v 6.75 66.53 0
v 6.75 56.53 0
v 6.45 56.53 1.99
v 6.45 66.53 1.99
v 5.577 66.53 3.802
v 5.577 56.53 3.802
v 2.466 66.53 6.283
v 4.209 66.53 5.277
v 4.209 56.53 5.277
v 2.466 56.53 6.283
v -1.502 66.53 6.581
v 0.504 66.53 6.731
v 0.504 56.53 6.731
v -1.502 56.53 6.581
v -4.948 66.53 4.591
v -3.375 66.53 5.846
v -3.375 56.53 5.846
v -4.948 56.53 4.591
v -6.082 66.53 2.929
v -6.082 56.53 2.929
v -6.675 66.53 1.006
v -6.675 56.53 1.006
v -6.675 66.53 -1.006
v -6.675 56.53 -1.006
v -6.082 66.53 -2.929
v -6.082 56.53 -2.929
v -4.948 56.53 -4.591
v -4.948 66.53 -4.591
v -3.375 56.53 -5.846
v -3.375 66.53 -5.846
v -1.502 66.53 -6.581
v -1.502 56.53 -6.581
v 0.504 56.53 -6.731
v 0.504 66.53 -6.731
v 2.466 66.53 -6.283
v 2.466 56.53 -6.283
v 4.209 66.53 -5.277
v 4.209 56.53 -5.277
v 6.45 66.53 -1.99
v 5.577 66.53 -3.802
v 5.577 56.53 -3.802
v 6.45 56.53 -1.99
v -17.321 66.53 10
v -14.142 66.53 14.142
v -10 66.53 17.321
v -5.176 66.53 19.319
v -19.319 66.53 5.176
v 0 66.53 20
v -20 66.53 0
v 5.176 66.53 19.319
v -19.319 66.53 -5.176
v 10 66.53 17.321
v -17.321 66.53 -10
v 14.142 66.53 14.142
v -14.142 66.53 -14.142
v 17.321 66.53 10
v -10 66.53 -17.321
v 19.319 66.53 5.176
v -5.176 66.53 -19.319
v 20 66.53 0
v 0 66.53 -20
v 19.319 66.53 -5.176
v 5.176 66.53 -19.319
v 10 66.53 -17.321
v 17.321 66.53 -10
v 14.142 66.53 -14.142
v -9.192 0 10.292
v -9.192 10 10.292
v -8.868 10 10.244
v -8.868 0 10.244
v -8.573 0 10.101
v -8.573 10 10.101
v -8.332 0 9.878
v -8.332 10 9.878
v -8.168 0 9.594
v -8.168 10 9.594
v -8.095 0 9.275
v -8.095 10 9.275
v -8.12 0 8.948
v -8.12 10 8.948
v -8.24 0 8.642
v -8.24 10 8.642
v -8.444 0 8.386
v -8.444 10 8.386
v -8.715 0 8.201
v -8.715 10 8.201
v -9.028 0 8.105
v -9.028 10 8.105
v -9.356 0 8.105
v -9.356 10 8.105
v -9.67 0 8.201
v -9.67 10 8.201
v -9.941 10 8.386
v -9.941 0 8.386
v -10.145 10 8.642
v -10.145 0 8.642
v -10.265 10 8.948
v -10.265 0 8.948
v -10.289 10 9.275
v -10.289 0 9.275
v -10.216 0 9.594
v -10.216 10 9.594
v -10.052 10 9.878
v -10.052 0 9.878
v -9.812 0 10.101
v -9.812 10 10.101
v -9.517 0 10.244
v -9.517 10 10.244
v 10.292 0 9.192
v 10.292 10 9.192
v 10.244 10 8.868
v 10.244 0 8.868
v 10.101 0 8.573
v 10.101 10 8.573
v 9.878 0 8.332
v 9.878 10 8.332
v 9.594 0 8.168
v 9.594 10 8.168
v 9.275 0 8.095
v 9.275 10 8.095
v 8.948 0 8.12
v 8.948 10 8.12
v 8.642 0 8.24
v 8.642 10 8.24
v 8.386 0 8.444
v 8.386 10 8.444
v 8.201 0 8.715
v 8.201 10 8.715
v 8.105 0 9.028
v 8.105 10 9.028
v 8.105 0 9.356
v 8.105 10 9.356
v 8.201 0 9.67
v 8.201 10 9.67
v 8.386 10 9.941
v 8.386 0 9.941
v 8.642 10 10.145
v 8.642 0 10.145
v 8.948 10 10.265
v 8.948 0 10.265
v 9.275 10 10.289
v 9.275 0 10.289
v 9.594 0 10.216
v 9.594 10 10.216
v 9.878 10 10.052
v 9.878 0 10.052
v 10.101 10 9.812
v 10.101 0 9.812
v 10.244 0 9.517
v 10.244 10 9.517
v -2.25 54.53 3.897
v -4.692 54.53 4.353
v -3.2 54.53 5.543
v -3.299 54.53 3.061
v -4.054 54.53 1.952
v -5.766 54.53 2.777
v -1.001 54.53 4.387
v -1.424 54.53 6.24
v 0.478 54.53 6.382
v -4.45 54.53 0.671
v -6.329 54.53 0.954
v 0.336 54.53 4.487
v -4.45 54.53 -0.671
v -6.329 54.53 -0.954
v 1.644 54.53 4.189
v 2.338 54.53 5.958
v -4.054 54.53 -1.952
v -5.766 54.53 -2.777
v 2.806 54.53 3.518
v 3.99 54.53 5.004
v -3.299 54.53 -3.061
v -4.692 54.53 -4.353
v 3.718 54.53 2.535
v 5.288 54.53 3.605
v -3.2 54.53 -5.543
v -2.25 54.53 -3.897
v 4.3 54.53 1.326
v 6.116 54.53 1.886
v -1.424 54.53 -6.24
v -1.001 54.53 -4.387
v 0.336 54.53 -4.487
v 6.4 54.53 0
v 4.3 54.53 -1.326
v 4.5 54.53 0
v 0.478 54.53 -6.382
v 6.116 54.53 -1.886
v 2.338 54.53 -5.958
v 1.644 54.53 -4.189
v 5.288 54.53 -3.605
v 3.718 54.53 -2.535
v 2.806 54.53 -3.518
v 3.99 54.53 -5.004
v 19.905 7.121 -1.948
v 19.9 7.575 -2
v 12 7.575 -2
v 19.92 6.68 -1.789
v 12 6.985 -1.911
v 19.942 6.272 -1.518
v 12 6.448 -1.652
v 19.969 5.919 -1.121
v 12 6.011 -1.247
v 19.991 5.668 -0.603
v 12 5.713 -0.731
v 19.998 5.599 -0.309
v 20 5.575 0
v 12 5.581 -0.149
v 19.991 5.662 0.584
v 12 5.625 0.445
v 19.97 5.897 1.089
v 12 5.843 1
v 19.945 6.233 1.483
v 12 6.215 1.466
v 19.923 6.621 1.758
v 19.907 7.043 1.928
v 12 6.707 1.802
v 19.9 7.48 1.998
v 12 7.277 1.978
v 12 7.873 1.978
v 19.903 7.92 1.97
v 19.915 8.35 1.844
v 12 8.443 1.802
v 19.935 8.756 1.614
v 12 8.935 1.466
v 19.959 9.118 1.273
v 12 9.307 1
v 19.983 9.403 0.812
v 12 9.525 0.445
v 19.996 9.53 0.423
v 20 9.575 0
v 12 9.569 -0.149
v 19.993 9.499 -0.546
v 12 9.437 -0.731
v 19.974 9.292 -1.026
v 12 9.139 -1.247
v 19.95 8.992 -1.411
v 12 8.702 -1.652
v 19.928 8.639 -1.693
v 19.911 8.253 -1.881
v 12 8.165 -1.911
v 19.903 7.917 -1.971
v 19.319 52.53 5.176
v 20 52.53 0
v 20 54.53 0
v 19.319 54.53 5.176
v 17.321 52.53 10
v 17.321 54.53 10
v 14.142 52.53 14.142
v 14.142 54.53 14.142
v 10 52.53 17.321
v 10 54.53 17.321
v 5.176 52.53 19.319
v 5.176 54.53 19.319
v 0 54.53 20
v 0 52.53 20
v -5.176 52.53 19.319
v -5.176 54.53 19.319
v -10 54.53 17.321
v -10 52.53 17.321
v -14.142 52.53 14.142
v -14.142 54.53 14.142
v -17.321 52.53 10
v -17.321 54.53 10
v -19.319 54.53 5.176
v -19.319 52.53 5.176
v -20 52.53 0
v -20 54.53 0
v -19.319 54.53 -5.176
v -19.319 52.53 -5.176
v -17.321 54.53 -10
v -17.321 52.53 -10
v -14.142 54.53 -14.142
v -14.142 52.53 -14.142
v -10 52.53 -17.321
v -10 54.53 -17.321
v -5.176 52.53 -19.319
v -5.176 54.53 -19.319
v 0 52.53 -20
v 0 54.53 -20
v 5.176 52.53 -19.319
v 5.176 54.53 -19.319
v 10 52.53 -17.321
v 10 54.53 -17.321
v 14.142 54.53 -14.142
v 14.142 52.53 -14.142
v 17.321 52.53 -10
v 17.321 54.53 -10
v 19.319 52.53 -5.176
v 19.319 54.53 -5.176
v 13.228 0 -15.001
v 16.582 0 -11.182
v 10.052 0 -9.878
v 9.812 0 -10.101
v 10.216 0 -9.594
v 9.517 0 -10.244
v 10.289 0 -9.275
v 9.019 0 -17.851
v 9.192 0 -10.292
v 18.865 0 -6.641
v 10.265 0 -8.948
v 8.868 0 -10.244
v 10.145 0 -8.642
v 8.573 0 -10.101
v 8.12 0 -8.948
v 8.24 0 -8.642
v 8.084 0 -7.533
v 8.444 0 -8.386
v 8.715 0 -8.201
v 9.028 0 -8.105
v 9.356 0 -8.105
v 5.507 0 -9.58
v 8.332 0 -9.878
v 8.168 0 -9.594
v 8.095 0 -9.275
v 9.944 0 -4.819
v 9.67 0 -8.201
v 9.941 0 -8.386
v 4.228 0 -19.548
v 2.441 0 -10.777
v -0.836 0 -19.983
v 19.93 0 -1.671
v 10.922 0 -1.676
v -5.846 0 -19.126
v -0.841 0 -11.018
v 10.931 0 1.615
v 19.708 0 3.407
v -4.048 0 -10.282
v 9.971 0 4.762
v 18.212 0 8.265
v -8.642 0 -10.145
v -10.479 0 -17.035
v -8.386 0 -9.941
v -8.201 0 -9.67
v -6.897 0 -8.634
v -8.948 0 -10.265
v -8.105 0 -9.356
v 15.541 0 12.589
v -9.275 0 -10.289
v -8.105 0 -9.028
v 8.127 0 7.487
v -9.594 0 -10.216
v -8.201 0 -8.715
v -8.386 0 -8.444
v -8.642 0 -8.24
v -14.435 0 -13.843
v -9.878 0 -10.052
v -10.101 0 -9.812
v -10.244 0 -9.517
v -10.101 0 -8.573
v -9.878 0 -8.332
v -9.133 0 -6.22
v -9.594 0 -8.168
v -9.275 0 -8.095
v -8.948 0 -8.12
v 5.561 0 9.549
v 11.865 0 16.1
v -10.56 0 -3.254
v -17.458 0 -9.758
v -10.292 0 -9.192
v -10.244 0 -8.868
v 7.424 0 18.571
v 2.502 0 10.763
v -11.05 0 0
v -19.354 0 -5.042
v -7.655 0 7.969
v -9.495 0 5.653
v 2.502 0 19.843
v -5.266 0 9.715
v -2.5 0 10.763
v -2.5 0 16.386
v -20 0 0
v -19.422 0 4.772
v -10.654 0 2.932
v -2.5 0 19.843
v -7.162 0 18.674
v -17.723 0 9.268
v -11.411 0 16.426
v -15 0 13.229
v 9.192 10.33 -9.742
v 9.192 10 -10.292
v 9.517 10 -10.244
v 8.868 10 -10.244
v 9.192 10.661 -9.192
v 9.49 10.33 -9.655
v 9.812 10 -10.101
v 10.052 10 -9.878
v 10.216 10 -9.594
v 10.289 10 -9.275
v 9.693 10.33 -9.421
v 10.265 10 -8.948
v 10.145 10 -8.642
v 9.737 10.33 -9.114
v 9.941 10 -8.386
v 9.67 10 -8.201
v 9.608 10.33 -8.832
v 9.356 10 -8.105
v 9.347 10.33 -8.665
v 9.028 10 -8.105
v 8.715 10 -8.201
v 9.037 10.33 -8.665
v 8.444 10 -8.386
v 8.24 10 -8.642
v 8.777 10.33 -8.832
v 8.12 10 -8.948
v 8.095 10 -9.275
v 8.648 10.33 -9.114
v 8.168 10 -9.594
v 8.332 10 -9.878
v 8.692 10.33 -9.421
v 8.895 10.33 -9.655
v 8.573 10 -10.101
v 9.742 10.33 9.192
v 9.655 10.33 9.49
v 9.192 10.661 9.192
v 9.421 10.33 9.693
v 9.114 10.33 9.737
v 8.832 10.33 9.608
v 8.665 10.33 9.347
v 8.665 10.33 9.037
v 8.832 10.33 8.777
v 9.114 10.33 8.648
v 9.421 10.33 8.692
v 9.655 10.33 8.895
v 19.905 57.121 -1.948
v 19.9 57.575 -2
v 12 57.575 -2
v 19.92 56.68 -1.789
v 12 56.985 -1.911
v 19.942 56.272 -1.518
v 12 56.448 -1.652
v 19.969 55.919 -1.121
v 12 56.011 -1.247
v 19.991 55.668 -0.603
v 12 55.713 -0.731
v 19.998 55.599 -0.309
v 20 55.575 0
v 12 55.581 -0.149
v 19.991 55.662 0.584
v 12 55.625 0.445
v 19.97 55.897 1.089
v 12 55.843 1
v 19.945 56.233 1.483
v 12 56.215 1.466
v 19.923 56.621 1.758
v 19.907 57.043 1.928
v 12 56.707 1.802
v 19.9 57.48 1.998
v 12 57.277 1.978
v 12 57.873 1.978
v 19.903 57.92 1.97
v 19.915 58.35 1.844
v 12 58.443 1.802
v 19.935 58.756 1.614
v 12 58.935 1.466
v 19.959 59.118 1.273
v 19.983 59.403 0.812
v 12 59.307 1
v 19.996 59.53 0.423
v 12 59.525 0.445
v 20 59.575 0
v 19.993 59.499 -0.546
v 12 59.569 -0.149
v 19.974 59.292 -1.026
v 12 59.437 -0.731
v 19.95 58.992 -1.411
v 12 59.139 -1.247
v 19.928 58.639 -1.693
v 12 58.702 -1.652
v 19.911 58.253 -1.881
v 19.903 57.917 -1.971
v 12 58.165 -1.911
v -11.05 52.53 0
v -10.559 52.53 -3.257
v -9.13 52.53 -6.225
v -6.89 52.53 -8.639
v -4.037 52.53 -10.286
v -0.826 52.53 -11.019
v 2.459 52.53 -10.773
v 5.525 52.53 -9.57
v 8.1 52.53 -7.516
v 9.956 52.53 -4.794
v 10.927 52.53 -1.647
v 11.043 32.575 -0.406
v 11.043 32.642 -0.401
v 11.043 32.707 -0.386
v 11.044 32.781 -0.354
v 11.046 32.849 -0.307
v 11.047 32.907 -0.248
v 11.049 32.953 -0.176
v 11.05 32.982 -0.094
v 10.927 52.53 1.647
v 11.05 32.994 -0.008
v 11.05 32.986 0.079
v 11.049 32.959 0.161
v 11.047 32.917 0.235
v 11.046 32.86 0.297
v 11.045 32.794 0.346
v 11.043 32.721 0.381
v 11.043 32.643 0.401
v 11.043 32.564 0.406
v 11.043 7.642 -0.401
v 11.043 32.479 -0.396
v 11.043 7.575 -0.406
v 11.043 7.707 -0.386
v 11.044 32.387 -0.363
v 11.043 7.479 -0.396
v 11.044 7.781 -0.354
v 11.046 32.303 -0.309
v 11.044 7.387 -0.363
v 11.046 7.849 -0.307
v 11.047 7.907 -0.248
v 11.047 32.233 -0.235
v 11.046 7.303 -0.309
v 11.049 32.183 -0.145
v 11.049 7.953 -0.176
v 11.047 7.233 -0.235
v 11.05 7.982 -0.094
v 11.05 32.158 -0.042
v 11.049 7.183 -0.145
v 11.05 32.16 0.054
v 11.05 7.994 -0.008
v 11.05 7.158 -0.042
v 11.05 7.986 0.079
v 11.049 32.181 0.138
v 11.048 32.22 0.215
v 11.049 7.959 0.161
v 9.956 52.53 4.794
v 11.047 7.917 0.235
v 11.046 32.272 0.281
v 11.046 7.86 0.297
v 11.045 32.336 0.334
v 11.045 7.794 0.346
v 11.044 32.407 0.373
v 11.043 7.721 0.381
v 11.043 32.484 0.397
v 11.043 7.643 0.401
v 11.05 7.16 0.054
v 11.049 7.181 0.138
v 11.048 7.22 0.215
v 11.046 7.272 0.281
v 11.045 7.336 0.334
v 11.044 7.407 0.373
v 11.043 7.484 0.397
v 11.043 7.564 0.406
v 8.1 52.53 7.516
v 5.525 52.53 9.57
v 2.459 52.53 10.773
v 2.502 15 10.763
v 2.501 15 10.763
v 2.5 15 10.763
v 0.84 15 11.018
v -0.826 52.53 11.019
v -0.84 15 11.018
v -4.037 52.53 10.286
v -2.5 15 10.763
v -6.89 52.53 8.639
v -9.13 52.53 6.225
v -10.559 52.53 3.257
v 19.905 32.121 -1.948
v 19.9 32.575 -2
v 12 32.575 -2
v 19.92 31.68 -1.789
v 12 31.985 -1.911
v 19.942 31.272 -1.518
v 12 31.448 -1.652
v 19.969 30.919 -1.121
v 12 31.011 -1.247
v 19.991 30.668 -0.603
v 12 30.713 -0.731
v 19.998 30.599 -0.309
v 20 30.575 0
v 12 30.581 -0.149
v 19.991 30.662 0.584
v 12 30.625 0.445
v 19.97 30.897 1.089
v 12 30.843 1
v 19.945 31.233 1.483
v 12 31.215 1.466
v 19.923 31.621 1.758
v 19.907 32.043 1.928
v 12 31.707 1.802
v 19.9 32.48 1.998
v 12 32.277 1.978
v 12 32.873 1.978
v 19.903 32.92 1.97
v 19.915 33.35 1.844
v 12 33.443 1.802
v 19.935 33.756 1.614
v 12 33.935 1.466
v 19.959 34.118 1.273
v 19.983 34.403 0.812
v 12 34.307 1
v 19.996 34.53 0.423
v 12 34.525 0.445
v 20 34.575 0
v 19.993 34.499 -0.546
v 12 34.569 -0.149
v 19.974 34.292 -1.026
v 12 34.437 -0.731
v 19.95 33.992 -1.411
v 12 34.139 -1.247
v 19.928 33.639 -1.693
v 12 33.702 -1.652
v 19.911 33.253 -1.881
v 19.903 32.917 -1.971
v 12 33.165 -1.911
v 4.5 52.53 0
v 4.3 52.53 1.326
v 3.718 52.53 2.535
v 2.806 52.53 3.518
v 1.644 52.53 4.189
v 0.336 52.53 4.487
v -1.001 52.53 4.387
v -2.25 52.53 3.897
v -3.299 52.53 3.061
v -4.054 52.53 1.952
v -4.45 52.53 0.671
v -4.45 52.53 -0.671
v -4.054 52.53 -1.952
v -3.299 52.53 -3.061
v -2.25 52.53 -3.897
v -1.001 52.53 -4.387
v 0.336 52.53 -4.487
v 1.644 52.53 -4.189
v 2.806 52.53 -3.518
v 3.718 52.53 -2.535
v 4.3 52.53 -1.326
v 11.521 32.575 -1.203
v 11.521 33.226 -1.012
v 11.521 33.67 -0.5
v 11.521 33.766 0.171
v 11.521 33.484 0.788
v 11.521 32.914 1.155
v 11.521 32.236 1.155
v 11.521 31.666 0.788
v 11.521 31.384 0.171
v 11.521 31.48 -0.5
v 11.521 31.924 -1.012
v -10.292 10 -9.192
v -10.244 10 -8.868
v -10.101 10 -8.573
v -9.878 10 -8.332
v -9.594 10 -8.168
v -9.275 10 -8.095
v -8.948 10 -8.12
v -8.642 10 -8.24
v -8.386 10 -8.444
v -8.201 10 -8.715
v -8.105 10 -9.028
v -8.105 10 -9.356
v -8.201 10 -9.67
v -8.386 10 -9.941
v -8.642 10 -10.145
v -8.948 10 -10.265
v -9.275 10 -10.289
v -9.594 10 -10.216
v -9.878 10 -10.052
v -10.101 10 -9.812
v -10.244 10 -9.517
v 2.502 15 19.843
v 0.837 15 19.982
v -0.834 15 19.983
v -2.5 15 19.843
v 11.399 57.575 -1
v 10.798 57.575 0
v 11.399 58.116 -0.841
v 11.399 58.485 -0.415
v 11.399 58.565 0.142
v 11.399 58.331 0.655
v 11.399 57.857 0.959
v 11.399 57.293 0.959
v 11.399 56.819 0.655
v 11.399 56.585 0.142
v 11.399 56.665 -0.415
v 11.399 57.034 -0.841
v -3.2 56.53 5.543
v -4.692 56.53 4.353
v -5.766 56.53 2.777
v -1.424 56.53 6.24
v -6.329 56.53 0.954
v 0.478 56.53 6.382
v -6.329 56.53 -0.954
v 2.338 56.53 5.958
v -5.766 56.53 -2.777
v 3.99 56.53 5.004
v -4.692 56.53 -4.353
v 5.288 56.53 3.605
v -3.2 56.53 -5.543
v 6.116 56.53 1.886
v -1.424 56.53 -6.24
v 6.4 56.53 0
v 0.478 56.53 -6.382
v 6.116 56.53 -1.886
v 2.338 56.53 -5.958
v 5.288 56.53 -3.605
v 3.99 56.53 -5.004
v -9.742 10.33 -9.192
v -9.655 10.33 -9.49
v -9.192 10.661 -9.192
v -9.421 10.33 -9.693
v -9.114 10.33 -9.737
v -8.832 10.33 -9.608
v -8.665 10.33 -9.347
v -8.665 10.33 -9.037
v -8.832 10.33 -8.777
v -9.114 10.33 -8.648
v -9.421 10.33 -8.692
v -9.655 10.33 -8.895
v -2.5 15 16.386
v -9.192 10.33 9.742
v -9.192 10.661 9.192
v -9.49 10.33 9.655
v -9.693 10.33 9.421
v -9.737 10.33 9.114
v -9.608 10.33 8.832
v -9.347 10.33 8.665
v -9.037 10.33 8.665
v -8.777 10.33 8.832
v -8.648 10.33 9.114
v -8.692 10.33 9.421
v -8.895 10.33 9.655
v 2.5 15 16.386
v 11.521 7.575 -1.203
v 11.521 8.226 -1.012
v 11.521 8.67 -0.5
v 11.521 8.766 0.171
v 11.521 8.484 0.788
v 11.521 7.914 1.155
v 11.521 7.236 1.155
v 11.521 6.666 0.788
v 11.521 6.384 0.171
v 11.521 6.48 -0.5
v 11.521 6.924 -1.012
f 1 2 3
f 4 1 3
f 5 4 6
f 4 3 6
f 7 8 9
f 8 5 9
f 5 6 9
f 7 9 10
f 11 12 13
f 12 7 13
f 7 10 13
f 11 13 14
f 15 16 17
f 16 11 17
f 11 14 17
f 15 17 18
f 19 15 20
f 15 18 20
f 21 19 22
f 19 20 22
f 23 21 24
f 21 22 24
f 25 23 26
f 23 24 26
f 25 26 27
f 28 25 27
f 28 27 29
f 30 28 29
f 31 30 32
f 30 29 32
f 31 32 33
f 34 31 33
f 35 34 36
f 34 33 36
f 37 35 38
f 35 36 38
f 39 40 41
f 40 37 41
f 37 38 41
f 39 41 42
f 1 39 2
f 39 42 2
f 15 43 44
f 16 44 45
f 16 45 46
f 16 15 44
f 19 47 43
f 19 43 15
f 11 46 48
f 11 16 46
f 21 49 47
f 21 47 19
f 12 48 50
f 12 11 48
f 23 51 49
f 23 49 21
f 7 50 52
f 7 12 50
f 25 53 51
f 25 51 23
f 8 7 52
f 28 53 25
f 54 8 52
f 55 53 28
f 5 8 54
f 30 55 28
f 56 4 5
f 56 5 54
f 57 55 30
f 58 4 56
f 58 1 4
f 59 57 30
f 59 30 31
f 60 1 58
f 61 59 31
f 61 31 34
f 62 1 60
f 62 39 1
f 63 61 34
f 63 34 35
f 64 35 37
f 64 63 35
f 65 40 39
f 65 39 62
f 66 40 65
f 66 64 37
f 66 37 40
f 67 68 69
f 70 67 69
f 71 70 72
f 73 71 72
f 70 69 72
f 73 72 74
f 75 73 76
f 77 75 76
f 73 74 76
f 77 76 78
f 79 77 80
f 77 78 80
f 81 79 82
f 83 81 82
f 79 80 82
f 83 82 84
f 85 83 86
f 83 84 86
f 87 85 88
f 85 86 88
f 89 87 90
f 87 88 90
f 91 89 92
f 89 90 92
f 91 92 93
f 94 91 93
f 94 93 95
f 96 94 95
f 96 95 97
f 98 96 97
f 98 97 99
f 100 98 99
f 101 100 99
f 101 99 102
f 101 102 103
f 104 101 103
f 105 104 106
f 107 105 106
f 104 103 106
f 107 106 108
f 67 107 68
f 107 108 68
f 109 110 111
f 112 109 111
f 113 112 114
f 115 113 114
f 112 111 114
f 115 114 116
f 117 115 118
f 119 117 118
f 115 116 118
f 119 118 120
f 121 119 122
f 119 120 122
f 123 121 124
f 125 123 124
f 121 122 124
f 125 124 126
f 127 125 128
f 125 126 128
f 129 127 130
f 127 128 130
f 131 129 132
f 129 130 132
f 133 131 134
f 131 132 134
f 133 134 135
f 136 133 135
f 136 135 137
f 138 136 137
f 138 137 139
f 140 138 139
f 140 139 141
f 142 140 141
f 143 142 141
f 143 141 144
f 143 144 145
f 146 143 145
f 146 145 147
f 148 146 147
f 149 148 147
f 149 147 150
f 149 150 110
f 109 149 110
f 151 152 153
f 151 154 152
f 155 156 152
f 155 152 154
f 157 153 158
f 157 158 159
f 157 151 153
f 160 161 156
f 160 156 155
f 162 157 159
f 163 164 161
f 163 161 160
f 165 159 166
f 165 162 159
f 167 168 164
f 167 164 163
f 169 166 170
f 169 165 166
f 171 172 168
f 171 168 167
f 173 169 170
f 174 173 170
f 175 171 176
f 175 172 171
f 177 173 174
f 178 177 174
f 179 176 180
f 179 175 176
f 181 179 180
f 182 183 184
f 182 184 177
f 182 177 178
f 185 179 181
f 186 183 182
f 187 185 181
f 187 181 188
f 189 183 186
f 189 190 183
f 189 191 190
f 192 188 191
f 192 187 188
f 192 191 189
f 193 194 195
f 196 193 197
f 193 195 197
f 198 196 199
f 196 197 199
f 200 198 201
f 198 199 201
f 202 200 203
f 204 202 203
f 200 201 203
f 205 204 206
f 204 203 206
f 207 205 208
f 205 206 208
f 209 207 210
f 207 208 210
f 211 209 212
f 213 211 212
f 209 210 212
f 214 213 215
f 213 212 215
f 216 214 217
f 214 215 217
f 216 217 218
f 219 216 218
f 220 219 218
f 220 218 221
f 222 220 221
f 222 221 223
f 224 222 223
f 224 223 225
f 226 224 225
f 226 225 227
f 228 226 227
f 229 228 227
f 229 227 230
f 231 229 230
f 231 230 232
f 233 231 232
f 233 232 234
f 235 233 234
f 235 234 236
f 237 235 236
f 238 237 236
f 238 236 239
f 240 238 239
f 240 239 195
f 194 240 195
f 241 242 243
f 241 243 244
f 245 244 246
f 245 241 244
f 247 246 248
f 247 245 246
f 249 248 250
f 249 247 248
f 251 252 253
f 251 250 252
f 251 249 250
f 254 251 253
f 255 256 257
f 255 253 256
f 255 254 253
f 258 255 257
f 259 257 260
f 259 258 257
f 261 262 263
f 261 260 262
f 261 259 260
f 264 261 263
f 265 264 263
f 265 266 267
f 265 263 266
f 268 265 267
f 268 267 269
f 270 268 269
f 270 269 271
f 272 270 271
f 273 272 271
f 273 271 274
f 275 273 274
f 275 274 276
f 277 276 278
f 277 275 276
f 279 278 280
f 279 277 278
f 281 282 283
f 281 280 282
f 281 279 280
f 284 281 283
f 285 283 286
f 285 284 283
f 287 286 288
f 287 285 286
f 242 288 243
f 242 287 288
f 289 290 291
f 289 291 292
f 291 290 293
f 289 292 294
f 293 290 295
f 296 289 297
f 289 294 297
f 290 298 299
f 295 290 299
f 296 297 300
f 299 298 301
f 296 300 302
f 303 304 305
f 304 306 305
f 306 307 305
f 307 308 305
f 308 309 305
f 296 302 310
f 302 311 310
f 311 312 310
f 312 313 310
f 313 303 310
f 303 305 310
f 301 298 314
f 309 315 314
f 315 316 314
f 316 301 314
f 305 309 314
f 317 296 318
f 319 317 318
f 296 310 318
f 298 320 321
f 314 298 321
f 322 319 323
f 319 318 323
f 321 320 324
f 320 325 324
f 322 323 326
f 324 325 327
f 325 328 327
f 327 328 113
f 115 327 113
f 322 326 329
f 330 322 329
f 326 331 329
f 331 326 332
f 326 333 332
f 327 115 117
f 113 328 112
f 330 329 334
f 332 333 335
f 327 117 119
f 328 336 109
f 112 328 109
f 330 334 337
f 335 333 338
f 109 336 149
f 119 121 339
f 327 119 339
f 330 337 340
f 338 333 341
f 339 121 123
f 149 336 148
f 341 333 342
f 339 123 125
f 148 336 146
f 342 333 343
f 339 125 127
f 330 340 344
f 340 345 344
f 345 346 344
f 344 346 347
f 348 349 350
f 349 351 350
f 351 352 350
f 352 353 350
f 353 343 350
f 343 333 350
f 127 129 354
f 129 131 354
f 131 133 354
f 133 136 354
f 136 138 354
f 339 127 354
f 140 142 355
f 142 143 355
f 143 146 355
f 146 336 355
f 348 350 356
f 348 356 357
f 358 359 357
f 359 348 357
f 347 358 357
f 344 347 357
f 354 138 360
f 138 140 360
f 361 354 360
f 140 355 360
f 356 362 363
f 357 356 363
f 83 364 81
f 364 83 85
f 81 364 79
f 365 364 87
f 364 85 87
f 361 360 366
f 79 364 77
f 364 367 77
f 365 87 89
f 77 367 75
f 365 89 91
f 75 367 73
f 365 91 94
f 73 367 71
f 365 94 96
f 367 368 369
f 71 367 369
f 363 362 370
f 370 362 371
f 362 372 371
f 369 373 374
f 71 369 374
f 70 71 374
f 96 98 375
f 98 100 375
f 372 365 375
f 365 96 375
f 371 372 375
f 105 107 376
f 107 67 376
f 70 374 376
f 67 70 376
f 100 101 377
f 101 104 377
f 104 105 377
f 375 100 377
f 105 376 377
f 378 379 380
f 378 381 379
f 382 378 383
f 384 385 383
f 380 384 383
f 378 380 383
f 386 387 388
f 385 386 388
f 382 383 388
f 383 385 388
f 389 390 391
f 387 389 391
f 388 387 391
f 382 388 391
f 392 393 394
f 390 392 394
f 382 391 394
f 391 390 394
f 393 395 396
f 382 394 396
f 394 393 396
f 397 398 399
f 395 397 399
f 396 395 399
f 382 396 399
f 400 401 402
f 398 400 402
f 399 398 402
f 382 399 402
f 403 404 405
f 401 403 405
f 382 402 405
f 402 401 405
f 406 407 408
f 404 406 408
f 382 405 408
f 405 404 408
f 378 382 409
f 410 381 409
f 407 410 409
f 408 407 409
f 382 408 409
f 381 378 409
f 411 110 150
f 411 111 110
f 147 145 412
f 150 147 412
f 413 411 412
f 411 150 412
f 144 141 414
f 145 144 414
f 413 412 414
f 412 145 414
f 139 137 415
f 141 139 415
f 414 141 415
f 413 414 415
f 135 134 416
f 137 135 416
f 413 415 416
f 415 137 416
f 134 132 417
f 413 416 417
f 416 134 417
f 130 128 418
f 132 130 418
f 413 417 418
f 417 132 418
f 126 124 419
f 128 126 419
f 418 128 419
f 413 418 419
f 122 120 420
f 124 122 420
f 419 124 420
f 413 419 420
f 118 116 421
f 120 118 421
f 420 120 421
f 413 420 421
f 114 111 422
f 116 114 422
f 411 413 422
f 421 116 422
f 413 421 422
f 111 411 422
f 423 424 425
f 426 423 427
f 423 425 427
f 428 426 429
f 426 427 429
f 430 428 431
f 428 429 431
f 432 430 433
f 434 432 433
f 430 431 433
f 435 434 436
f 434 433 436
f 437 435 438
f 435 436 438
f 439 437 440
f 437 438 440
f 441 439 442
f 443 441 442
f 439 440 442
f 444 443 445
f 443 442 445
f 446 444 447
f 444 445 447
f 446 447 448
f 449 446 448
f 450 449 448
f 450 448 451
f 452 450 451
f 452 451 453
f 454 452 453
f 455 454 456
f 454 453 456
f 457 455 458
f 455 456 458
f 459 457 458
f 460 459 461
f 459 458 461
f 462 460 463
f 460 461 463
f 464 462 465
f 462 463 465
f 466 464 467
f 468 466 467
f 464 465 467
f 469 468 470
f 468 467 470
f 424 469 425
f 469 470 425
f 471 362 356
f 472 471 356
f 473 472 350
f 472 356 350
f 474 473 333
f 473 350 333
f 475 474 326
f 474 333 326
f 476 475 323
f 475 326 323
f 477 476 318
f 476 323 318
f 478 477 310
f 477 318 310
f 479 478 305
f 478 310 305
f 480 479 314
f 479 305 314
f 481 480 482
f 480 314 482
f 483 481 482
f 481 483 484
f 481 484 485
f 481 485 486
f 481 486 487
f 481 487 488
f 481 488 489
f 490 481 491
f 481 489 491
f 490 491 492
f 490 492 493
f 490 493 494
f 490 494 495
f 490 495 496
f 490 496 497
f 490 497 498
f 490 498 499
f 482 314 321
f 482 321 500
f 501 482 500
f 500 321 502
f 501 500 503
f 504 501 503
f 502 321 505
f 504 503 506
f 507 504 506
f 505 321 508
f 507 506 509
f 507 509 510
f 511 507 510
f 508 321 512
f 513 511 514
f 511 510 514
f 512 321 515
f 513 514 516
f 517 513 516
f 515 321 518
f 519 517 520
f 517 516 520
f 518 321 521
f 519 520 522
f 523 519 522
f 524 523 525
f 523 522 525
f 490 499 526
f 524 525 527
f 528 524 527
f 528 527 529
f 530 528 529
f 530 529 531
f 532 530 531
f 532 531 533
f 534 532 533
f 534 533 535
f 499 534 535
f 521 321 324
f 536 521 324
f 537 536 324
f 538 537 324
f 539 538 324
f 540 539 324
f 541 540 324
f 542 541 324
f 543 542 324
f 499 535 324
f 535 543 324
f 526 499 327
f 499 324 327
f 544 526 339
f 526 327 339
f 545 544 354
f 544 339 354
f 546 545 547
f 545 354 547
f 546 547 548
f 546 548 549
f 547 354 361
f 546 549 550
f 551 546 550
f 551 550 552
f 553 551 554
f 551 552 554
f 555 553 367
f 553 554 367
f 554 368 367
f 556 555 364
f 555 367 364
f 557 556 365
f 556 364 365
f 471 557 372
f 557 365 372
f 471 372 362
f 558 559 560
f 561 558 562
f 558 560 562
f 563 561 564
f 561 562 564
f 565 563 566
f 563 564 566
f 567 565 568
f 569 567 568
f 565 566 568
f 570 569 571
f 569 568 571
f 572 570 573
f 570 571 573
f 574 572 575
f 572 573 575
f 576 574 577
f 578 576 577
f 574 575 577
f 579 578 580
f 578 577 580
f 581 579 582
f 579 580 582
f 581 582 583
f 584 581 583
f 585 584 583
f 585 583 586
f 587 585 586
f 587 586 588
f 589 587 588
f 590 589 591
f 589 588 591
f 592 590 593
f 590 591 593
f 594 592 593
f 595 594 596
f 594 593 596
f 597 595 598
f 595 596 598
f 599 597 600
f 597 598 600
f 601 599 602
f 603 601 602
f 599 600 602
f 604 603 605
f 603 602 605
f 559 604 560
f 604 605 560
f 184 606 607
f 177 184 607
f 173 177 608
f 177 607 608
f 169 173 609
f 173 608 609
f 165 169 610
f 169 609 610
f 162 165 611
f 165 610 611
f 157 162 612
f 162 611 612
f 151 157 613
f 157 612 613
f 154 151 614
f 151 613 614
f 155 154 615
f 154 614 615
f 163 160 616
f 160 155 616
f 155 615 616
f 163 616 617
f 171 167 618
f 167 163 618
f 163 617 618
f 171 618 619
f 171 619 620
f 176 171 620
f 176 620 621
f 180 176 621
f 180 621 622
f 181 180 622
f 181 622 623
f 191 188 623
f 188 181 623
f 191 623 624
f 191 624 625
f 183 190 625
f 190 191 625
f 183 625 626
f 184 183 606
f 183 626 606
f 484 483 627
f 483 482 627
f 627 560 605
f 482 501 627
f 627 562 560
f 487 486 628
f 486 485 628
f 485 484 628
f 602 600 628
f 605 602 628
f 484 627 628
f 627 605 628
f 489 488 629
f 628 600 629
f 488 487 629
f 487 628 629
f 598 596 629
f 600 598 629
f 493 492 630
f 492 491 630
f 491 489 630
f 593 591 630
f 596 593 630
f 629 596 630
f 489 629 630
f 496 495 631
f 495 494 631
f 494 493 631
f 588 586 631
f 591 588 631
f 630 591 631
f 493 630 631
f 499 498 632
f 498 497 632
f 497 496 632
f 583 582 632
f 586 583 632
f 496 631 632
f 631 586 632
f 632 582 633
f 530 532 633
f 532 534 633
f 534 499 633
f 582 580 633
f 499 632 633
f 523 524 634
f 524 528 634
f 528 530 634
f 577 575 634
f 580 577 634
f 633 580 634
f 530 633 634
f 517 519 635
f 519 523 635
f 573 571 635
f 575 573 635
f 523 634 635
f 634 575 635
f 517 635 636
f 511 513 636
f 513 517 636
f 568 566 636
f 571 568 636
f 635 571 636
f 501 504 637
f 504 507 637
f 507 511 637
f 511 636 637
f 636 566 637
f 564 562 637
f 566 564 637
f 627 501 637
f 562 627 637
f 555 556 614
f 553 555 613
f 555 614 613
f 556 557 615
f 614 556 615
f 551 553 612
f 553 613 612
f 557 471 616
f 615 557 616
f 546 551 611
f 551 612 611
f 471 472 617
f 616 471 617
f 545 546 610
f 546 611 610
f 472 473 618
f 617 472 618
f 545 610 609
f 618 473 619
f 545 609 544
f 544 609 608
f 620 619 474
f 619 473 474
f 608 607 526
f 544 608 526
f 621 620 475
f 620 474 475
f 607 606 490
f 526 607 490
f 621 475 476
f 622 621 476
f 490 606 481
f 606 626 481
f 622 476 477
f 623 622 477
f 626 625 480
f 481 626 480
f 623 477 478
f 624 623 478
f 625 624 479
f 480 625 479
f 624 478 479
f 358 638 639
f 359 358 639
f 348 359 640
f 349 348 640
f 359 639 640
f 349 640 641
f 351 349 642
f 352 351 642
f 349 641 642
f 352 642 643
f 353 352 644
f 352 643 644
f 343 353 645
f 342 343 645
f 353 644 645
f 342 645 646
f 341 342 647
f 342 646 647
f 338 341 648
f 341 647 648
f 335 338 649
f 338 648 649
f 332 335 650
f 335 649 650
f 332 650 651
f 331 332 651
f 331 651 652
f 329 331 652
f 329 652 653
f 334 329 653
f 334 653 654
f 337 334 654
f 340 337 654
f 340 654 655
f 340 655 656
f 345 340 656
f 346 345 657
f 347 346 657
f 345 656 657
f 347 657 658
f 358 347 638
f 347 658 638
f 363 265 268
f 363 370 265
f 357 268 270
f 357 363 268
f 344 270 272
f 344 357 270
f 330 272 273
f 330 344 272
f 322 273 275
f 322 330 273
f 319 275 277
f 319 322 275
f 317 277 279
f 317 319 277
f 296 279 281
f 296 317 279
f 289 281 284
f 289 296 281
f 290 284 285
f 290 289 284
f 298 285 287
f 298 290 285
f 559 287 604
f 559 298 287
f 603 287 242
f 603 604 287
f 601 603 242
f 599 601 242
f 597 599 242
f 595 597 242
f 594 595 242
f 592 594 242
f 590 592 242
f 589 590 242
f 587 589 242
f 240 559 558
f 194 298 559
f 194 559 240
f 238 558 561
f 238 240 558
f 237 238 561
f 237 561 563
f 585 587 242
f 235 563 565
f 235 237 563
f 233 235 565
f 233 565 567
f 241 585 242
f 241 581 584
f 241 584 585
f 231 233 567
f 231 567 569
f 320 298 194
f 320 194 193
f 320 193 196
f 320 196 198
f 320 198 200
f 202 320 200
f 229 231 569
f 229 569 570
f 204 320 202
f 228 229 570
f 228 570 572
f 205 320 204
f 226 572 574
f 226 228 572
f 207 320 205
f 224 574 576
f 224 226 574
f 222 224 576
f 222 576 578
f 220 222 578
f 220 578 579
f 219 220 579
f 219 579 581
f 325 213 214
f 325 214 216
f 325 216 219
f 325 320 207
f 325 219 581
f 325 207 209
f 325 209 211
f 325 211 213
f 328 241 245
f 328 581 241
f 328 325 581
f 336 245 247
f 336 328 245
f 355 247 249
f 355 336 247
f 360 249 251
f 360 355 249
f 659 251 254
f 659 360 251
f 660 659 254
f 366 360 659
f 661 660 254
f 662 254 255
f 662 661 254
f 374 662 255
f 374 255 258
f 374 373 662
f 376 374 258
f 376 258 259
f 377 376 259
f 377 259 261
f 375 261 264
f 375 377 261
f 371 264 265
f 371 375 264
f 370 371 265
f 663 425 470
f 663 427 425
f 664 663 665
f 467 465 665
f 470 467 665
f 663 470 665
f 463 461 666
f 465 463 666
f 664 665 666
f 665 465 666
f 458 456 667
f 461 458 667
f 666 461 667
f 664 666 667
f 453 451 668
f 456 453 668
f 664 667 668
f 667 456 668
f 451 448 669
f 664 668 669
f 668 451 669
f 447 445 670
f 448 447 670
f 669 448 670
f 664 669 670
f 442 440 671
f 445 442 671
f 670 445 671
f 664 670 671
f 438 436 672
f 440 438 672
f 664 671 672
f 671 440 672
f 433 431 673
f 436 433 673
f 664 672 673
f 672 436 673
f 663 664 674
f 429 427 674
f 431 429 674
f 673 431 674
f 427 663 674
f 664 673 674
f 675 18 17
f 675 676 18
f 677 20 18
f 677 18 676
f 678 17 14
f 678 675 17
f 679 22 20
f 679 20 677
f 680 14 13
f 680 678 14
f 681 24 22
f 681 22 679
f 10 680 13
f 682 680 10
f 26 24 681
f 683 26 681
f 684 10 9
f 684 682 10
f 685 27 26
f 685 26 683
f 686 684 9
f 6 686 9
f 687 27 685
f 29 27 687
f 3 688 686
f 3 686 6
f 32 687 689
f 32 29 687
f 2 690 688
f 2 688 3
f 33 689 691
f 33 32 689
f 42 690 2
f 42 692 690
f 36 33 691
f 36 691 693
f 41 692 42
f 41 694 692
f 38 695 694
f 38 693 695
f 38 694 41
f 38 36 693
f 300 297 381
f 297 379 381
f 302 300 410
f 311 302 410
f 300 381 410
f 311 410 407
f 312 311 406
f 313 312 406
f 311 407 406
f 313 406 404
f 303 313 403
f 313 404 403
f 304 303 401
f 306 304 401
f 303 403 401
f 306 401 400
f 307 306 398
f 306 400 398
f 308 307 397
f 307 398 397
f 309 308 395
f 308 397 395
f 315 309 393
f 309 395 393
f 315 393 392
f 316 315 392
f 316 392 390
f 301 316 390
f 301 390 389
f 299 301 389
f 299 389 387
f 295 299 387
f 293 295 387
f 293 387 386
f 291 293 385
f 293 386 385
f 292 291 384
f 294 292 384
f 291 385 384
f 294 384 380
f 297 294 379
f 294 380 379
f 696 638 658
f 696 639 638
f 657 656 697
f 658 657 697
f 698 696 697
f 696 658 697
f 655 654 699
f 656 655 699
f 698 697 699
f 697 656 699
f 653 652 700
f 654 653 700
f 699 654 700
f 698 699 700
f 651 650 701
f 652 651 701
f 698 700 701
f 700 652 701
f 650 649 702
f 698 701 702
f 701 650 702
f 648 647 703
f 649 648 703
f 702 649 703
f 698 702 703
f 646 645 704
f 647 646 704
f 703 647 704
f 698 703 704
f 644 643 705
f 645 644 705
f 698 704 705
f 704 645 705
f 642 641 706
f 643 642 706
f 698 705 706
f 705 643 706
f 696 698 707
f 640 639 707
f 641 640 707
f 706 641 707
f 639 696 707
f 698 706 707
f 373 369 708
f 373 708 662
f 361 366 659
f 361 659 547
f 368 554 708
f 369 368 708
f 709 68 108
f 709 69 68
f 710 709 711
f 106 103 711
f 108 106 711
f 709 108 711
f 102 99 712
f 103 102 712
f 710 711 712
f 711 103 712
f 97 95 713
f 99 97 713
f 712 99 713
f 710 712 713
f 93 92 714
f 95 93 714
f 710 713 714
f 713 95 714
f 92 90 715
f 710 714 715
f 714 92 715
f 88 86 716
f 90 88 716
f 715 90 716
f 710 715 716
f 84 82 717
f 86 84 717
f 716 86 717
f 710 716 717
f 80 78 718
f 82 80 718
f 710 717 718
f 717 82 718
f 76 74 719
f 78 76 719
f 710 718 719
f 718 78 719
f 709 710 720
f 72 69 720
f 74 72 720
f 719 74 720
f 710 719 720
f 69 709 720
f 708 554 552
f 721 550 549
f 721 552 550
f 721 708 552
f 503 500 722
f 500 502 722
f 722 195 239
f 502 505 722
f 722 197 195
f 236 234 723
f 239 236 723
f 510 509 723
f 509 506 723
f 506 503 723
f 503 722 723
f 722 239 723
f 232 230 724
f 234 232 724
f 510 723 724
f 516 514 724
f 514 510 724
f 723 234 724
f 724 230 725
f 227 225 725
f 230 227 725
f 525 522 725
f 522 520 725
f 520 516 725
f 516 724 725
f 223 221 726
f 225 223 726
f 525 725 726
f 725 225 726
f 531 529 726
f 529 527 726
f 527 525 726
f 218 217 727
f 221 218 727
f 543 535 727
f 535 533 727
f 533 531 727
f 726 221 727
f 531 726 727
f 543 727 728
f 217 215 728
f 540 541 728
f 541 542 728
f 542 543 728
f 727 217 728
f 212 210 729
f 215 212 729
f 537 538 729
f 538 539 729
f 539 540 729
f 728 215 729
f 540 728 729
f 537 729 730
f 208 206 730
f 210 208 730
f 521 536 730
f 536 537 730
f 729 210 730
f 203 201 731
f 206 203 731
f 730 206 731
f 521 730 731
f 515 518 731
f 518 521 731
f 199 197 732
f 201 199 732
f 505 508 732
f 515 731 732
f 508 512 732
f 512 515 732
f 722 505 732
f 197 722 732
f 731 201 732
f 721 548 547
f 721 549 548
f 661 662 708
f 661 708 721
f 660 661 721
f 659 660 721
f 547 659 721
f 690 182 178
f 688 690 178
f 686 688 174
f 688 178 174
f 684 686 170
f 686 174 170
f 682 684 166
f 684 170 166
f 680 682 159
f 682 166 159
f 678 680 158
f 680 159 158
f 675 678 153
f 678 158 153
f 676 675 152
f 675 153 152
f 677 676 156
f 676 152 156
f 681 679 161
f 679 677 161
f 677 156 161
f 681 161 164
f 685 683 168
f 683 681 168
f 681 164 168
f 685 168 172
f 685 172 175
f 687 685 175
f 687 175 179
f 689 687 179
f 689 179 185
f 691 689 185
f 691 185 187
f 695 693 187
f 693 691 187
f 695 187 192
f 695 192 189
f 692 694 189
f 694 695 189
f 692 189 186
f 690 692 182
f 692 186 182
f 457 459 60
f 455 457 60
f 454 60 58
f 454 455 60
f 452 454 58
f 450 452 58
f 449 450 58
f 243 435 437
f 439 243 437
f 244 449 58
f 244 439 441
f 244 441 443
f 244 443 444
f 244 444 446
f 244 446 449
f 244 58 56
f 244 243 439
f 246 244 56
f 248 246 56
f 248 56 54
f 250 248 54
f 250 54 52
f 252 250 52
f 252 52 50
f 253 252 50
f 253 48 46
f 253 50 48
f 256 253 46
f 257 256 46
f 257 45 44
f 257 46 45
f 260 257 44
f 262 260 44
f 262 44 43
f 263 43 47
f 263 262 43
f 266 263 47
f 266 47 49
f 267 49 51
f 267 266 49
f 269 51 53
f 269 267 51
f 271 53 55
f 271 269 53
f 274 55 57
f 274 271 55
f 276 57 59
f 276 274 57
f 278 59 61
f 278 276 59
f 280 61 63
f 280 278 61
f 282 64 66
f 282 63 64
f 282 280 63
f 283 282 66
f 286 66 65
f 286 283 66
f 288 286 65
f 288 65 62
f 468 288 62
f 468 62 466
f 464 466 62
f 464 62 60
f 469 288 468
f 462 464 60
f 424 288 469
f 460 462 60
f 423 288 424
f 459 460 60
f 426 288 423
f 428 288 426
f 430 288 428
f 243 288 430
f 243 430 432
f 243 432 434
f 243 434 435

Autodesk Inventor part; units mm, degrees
ref_plane "XZ Plane" through (0, 0, 0) normal (0, 1, 0) x (-1, 0, 0)
ref_plane "XY Plane" through (0, 0, 0) normal (0, 0, 1) x (1, 0, 0)
sketch "Sketch1" plane through (0, 0, 0) normal (0, 1, 0) x (-1, 0, 0)
  circle A0 centre (0, 0) radius 20
  circle A1 centre (0, 0) radius 11.05
  dimension "d0" = 40
  dimension "d1" = 22.1
extrude "Extrusion1" add sketch "Sketch1" along normal blind 52.53
sketch "Sketch2" plane through (0, 0, 0) normal (0, -1, 0) x (1, 0, 0)
  circle A0 centre (0, 0) radius 13
  line L0 (0, 0) -> (9.1924, 0)
  line L1 (9.1924, 0) -> (9.1924, -9.1924)
  line L2 (9.1924, -9.1924) -> (0, -9.1924)
  line L3 (0, -9.1924) -> (0, 0)
  dimension "d4" = 26
  dimension "d5" = 9.1924
hole "Hole1" at (9.1924, 0, -9.1924) direction (0, 1, 0) diameter 2.2 depth 10 tip angle 118
pattern_circular "Circular Pattern1" count 4 over 360 about axis through (0, 0, 0) along (0, 1, 0) of "Hole1"
thread "Thread1" size "M2.2x0.25" class "6H" standard "ISO Metric profile" full length
thread "Thread3" size "M2.2x0.25" class "6H" standard "ISO Metric profile" full length
thread "Thread4" size "M2.2x0.25" class "6H" standard "ISO Metric profile" full length
thread "Thread5" size "M2.2x0.25" class "6H" standard "ISO Metric profile" full length
sketch "Sketch3" plane through (0, 52.53, 0) normal (0, 1, 0) x (1, 0, 0)
  circle A0 centre (0, 0) radius 20
  circle A1 centre (0, 0) radius 4.5
  dimension "d26" = 40
  dimension "d27" = 9
extrude "Extrusion2" add sketch "Sketch3" along normal blind 2
sketch "Sketch4" plane through (0, 54.53, 0) normal (0, 1, 0) x (1, 0, 0)
  point P0 (0, 0)
sketch "Sketch5" plane through (0, 54.53, 0) normal (0, 1, 0) x (1, 0, 0)
  circle A0 centre (0, 0) radius 6.75
  circle A1 centre (0, 0) radius 20
  dimension "d30" = 13.5
  dimension "d31" = 40
extrude "Extrusion3" add sketch "Sketch5" along normal blind 12
thread "Thread6" size "M14x0.5" class "6H" standard "ISO Metric profile" full length
sketch "Sketch8" plane through (0, 0, 0) normal (0, -1, 0) x (1, 0, 0)
  point P0 (0, 0)
sketch "Sketch9" plane through (0, 0, 0) normal (0, -1, 0) x (1, 0, 0)
  line L0 (0, 9.7277) -> (2.5, 9.7277)
  line L1 (2.5, 9.7277) -> (2.5, 16.3855)
  line L2 (2.5, 16.3855) -> (0, 16.3855)
  line L3 (0, 16.3855) -> (0, 9.7277)
  line L4 (0, 9.7277) -> (-2.5, 9.7277)
  line L5 (-2.5, 9.7277) -> (-2.5, 16.3855)
  line L6 (-2.5, 16.3855) -> (0, 16.3855)
  line L7 (0, 16.3855) -> (0, 9.7277)
  point P0 (0, 0)
  dimension "d1" = 22.1
  dimension "d54" = 2.5
  dimension "d55" = 2.5
extrude "Extrusion4" cut sketch "Sketch9" against normal blind 15
sketch "Sketch10" plane through (0, 0, 0) normal (1, 0, 0) x (0, 1, 0)
  point P0 (0, 0)
ref_plane "Work Plane1" through (20, 0, 0) normal (1, 0, 0) x (0, 1, 0)
sketch "Sketch15" plane through (0, 0, 0) normal (0, -1, 0) x (1, 0, 0)
  line L0 (2.5024, 10.6669) -> (-2.5, 10.6669)
  line L1 (-2.5, 10.6669) -> (-2.5, 24.5822)
  line L2 (-2.5, 24.5822) -> (2.5024, 24.5822)
  line L3 (2.5024, 24.5822) -> (2.5024, 10.6669)
  point P0 (0, 0)
extrude "Extrusion5" cut sketch "Sketch15" against normal blind 15
sketch "Sketch18" plane through (20, 0, 0) normal (1, 0, 0) x (0, 1, 0)
  line L0 (0, 0) -> (7.575, 0)
  line L1 (7.575, 0) -> (32.575, 0)
  line L2 (32.575, 0) -> (57.575, 0)
  dimension "d102" = 7.575
  dimension "d103" = 25
  dimension "d104" = 25
  dimension "d105" = 180
hole "Hole6" at (20, 57.575, 0) direction (-1, 0, 0) diameter 4 depth 8 tip angle 118
hole "Hole7" at (20, 7.575, 0) at (20, 32.575, 0) direction (-1, 0, 0) diameter 4 depth 8 tip angle 118
thread "Thread7" size "M4x0.7" class "6H" standard "ANSI Metric M Profile" full length
thread "Thread8" size "M4x0.7" class "6H" standard "ANSI Metric M Profile" full length
thread "Thread9" size "M4x0.7" class "6H" standard "ANSI Metric M Profile" full length
sketch "Sketch19" plane through (0, 54.53, 0) normal (0, 1, 0) x (1, 0, 0)
  circle A0 centre (0, 0) radius 6.75
  circle A1 centre (0, 0) radius 6.4
  dimension "d128" = 13.5
  dimension "d129" = 12.8
extrude "Extrusion6" add sketch "Sketch19" along normal blind 2
thread "Thread11" size "M14x0.5" class "6H" standard "ANSI Metric M Profile" length 10
equation "\"d43\" = 60deg"
equation "\"Sketch6_Pitch\" = 0.5"
properties part number "16ghzenclosure"
